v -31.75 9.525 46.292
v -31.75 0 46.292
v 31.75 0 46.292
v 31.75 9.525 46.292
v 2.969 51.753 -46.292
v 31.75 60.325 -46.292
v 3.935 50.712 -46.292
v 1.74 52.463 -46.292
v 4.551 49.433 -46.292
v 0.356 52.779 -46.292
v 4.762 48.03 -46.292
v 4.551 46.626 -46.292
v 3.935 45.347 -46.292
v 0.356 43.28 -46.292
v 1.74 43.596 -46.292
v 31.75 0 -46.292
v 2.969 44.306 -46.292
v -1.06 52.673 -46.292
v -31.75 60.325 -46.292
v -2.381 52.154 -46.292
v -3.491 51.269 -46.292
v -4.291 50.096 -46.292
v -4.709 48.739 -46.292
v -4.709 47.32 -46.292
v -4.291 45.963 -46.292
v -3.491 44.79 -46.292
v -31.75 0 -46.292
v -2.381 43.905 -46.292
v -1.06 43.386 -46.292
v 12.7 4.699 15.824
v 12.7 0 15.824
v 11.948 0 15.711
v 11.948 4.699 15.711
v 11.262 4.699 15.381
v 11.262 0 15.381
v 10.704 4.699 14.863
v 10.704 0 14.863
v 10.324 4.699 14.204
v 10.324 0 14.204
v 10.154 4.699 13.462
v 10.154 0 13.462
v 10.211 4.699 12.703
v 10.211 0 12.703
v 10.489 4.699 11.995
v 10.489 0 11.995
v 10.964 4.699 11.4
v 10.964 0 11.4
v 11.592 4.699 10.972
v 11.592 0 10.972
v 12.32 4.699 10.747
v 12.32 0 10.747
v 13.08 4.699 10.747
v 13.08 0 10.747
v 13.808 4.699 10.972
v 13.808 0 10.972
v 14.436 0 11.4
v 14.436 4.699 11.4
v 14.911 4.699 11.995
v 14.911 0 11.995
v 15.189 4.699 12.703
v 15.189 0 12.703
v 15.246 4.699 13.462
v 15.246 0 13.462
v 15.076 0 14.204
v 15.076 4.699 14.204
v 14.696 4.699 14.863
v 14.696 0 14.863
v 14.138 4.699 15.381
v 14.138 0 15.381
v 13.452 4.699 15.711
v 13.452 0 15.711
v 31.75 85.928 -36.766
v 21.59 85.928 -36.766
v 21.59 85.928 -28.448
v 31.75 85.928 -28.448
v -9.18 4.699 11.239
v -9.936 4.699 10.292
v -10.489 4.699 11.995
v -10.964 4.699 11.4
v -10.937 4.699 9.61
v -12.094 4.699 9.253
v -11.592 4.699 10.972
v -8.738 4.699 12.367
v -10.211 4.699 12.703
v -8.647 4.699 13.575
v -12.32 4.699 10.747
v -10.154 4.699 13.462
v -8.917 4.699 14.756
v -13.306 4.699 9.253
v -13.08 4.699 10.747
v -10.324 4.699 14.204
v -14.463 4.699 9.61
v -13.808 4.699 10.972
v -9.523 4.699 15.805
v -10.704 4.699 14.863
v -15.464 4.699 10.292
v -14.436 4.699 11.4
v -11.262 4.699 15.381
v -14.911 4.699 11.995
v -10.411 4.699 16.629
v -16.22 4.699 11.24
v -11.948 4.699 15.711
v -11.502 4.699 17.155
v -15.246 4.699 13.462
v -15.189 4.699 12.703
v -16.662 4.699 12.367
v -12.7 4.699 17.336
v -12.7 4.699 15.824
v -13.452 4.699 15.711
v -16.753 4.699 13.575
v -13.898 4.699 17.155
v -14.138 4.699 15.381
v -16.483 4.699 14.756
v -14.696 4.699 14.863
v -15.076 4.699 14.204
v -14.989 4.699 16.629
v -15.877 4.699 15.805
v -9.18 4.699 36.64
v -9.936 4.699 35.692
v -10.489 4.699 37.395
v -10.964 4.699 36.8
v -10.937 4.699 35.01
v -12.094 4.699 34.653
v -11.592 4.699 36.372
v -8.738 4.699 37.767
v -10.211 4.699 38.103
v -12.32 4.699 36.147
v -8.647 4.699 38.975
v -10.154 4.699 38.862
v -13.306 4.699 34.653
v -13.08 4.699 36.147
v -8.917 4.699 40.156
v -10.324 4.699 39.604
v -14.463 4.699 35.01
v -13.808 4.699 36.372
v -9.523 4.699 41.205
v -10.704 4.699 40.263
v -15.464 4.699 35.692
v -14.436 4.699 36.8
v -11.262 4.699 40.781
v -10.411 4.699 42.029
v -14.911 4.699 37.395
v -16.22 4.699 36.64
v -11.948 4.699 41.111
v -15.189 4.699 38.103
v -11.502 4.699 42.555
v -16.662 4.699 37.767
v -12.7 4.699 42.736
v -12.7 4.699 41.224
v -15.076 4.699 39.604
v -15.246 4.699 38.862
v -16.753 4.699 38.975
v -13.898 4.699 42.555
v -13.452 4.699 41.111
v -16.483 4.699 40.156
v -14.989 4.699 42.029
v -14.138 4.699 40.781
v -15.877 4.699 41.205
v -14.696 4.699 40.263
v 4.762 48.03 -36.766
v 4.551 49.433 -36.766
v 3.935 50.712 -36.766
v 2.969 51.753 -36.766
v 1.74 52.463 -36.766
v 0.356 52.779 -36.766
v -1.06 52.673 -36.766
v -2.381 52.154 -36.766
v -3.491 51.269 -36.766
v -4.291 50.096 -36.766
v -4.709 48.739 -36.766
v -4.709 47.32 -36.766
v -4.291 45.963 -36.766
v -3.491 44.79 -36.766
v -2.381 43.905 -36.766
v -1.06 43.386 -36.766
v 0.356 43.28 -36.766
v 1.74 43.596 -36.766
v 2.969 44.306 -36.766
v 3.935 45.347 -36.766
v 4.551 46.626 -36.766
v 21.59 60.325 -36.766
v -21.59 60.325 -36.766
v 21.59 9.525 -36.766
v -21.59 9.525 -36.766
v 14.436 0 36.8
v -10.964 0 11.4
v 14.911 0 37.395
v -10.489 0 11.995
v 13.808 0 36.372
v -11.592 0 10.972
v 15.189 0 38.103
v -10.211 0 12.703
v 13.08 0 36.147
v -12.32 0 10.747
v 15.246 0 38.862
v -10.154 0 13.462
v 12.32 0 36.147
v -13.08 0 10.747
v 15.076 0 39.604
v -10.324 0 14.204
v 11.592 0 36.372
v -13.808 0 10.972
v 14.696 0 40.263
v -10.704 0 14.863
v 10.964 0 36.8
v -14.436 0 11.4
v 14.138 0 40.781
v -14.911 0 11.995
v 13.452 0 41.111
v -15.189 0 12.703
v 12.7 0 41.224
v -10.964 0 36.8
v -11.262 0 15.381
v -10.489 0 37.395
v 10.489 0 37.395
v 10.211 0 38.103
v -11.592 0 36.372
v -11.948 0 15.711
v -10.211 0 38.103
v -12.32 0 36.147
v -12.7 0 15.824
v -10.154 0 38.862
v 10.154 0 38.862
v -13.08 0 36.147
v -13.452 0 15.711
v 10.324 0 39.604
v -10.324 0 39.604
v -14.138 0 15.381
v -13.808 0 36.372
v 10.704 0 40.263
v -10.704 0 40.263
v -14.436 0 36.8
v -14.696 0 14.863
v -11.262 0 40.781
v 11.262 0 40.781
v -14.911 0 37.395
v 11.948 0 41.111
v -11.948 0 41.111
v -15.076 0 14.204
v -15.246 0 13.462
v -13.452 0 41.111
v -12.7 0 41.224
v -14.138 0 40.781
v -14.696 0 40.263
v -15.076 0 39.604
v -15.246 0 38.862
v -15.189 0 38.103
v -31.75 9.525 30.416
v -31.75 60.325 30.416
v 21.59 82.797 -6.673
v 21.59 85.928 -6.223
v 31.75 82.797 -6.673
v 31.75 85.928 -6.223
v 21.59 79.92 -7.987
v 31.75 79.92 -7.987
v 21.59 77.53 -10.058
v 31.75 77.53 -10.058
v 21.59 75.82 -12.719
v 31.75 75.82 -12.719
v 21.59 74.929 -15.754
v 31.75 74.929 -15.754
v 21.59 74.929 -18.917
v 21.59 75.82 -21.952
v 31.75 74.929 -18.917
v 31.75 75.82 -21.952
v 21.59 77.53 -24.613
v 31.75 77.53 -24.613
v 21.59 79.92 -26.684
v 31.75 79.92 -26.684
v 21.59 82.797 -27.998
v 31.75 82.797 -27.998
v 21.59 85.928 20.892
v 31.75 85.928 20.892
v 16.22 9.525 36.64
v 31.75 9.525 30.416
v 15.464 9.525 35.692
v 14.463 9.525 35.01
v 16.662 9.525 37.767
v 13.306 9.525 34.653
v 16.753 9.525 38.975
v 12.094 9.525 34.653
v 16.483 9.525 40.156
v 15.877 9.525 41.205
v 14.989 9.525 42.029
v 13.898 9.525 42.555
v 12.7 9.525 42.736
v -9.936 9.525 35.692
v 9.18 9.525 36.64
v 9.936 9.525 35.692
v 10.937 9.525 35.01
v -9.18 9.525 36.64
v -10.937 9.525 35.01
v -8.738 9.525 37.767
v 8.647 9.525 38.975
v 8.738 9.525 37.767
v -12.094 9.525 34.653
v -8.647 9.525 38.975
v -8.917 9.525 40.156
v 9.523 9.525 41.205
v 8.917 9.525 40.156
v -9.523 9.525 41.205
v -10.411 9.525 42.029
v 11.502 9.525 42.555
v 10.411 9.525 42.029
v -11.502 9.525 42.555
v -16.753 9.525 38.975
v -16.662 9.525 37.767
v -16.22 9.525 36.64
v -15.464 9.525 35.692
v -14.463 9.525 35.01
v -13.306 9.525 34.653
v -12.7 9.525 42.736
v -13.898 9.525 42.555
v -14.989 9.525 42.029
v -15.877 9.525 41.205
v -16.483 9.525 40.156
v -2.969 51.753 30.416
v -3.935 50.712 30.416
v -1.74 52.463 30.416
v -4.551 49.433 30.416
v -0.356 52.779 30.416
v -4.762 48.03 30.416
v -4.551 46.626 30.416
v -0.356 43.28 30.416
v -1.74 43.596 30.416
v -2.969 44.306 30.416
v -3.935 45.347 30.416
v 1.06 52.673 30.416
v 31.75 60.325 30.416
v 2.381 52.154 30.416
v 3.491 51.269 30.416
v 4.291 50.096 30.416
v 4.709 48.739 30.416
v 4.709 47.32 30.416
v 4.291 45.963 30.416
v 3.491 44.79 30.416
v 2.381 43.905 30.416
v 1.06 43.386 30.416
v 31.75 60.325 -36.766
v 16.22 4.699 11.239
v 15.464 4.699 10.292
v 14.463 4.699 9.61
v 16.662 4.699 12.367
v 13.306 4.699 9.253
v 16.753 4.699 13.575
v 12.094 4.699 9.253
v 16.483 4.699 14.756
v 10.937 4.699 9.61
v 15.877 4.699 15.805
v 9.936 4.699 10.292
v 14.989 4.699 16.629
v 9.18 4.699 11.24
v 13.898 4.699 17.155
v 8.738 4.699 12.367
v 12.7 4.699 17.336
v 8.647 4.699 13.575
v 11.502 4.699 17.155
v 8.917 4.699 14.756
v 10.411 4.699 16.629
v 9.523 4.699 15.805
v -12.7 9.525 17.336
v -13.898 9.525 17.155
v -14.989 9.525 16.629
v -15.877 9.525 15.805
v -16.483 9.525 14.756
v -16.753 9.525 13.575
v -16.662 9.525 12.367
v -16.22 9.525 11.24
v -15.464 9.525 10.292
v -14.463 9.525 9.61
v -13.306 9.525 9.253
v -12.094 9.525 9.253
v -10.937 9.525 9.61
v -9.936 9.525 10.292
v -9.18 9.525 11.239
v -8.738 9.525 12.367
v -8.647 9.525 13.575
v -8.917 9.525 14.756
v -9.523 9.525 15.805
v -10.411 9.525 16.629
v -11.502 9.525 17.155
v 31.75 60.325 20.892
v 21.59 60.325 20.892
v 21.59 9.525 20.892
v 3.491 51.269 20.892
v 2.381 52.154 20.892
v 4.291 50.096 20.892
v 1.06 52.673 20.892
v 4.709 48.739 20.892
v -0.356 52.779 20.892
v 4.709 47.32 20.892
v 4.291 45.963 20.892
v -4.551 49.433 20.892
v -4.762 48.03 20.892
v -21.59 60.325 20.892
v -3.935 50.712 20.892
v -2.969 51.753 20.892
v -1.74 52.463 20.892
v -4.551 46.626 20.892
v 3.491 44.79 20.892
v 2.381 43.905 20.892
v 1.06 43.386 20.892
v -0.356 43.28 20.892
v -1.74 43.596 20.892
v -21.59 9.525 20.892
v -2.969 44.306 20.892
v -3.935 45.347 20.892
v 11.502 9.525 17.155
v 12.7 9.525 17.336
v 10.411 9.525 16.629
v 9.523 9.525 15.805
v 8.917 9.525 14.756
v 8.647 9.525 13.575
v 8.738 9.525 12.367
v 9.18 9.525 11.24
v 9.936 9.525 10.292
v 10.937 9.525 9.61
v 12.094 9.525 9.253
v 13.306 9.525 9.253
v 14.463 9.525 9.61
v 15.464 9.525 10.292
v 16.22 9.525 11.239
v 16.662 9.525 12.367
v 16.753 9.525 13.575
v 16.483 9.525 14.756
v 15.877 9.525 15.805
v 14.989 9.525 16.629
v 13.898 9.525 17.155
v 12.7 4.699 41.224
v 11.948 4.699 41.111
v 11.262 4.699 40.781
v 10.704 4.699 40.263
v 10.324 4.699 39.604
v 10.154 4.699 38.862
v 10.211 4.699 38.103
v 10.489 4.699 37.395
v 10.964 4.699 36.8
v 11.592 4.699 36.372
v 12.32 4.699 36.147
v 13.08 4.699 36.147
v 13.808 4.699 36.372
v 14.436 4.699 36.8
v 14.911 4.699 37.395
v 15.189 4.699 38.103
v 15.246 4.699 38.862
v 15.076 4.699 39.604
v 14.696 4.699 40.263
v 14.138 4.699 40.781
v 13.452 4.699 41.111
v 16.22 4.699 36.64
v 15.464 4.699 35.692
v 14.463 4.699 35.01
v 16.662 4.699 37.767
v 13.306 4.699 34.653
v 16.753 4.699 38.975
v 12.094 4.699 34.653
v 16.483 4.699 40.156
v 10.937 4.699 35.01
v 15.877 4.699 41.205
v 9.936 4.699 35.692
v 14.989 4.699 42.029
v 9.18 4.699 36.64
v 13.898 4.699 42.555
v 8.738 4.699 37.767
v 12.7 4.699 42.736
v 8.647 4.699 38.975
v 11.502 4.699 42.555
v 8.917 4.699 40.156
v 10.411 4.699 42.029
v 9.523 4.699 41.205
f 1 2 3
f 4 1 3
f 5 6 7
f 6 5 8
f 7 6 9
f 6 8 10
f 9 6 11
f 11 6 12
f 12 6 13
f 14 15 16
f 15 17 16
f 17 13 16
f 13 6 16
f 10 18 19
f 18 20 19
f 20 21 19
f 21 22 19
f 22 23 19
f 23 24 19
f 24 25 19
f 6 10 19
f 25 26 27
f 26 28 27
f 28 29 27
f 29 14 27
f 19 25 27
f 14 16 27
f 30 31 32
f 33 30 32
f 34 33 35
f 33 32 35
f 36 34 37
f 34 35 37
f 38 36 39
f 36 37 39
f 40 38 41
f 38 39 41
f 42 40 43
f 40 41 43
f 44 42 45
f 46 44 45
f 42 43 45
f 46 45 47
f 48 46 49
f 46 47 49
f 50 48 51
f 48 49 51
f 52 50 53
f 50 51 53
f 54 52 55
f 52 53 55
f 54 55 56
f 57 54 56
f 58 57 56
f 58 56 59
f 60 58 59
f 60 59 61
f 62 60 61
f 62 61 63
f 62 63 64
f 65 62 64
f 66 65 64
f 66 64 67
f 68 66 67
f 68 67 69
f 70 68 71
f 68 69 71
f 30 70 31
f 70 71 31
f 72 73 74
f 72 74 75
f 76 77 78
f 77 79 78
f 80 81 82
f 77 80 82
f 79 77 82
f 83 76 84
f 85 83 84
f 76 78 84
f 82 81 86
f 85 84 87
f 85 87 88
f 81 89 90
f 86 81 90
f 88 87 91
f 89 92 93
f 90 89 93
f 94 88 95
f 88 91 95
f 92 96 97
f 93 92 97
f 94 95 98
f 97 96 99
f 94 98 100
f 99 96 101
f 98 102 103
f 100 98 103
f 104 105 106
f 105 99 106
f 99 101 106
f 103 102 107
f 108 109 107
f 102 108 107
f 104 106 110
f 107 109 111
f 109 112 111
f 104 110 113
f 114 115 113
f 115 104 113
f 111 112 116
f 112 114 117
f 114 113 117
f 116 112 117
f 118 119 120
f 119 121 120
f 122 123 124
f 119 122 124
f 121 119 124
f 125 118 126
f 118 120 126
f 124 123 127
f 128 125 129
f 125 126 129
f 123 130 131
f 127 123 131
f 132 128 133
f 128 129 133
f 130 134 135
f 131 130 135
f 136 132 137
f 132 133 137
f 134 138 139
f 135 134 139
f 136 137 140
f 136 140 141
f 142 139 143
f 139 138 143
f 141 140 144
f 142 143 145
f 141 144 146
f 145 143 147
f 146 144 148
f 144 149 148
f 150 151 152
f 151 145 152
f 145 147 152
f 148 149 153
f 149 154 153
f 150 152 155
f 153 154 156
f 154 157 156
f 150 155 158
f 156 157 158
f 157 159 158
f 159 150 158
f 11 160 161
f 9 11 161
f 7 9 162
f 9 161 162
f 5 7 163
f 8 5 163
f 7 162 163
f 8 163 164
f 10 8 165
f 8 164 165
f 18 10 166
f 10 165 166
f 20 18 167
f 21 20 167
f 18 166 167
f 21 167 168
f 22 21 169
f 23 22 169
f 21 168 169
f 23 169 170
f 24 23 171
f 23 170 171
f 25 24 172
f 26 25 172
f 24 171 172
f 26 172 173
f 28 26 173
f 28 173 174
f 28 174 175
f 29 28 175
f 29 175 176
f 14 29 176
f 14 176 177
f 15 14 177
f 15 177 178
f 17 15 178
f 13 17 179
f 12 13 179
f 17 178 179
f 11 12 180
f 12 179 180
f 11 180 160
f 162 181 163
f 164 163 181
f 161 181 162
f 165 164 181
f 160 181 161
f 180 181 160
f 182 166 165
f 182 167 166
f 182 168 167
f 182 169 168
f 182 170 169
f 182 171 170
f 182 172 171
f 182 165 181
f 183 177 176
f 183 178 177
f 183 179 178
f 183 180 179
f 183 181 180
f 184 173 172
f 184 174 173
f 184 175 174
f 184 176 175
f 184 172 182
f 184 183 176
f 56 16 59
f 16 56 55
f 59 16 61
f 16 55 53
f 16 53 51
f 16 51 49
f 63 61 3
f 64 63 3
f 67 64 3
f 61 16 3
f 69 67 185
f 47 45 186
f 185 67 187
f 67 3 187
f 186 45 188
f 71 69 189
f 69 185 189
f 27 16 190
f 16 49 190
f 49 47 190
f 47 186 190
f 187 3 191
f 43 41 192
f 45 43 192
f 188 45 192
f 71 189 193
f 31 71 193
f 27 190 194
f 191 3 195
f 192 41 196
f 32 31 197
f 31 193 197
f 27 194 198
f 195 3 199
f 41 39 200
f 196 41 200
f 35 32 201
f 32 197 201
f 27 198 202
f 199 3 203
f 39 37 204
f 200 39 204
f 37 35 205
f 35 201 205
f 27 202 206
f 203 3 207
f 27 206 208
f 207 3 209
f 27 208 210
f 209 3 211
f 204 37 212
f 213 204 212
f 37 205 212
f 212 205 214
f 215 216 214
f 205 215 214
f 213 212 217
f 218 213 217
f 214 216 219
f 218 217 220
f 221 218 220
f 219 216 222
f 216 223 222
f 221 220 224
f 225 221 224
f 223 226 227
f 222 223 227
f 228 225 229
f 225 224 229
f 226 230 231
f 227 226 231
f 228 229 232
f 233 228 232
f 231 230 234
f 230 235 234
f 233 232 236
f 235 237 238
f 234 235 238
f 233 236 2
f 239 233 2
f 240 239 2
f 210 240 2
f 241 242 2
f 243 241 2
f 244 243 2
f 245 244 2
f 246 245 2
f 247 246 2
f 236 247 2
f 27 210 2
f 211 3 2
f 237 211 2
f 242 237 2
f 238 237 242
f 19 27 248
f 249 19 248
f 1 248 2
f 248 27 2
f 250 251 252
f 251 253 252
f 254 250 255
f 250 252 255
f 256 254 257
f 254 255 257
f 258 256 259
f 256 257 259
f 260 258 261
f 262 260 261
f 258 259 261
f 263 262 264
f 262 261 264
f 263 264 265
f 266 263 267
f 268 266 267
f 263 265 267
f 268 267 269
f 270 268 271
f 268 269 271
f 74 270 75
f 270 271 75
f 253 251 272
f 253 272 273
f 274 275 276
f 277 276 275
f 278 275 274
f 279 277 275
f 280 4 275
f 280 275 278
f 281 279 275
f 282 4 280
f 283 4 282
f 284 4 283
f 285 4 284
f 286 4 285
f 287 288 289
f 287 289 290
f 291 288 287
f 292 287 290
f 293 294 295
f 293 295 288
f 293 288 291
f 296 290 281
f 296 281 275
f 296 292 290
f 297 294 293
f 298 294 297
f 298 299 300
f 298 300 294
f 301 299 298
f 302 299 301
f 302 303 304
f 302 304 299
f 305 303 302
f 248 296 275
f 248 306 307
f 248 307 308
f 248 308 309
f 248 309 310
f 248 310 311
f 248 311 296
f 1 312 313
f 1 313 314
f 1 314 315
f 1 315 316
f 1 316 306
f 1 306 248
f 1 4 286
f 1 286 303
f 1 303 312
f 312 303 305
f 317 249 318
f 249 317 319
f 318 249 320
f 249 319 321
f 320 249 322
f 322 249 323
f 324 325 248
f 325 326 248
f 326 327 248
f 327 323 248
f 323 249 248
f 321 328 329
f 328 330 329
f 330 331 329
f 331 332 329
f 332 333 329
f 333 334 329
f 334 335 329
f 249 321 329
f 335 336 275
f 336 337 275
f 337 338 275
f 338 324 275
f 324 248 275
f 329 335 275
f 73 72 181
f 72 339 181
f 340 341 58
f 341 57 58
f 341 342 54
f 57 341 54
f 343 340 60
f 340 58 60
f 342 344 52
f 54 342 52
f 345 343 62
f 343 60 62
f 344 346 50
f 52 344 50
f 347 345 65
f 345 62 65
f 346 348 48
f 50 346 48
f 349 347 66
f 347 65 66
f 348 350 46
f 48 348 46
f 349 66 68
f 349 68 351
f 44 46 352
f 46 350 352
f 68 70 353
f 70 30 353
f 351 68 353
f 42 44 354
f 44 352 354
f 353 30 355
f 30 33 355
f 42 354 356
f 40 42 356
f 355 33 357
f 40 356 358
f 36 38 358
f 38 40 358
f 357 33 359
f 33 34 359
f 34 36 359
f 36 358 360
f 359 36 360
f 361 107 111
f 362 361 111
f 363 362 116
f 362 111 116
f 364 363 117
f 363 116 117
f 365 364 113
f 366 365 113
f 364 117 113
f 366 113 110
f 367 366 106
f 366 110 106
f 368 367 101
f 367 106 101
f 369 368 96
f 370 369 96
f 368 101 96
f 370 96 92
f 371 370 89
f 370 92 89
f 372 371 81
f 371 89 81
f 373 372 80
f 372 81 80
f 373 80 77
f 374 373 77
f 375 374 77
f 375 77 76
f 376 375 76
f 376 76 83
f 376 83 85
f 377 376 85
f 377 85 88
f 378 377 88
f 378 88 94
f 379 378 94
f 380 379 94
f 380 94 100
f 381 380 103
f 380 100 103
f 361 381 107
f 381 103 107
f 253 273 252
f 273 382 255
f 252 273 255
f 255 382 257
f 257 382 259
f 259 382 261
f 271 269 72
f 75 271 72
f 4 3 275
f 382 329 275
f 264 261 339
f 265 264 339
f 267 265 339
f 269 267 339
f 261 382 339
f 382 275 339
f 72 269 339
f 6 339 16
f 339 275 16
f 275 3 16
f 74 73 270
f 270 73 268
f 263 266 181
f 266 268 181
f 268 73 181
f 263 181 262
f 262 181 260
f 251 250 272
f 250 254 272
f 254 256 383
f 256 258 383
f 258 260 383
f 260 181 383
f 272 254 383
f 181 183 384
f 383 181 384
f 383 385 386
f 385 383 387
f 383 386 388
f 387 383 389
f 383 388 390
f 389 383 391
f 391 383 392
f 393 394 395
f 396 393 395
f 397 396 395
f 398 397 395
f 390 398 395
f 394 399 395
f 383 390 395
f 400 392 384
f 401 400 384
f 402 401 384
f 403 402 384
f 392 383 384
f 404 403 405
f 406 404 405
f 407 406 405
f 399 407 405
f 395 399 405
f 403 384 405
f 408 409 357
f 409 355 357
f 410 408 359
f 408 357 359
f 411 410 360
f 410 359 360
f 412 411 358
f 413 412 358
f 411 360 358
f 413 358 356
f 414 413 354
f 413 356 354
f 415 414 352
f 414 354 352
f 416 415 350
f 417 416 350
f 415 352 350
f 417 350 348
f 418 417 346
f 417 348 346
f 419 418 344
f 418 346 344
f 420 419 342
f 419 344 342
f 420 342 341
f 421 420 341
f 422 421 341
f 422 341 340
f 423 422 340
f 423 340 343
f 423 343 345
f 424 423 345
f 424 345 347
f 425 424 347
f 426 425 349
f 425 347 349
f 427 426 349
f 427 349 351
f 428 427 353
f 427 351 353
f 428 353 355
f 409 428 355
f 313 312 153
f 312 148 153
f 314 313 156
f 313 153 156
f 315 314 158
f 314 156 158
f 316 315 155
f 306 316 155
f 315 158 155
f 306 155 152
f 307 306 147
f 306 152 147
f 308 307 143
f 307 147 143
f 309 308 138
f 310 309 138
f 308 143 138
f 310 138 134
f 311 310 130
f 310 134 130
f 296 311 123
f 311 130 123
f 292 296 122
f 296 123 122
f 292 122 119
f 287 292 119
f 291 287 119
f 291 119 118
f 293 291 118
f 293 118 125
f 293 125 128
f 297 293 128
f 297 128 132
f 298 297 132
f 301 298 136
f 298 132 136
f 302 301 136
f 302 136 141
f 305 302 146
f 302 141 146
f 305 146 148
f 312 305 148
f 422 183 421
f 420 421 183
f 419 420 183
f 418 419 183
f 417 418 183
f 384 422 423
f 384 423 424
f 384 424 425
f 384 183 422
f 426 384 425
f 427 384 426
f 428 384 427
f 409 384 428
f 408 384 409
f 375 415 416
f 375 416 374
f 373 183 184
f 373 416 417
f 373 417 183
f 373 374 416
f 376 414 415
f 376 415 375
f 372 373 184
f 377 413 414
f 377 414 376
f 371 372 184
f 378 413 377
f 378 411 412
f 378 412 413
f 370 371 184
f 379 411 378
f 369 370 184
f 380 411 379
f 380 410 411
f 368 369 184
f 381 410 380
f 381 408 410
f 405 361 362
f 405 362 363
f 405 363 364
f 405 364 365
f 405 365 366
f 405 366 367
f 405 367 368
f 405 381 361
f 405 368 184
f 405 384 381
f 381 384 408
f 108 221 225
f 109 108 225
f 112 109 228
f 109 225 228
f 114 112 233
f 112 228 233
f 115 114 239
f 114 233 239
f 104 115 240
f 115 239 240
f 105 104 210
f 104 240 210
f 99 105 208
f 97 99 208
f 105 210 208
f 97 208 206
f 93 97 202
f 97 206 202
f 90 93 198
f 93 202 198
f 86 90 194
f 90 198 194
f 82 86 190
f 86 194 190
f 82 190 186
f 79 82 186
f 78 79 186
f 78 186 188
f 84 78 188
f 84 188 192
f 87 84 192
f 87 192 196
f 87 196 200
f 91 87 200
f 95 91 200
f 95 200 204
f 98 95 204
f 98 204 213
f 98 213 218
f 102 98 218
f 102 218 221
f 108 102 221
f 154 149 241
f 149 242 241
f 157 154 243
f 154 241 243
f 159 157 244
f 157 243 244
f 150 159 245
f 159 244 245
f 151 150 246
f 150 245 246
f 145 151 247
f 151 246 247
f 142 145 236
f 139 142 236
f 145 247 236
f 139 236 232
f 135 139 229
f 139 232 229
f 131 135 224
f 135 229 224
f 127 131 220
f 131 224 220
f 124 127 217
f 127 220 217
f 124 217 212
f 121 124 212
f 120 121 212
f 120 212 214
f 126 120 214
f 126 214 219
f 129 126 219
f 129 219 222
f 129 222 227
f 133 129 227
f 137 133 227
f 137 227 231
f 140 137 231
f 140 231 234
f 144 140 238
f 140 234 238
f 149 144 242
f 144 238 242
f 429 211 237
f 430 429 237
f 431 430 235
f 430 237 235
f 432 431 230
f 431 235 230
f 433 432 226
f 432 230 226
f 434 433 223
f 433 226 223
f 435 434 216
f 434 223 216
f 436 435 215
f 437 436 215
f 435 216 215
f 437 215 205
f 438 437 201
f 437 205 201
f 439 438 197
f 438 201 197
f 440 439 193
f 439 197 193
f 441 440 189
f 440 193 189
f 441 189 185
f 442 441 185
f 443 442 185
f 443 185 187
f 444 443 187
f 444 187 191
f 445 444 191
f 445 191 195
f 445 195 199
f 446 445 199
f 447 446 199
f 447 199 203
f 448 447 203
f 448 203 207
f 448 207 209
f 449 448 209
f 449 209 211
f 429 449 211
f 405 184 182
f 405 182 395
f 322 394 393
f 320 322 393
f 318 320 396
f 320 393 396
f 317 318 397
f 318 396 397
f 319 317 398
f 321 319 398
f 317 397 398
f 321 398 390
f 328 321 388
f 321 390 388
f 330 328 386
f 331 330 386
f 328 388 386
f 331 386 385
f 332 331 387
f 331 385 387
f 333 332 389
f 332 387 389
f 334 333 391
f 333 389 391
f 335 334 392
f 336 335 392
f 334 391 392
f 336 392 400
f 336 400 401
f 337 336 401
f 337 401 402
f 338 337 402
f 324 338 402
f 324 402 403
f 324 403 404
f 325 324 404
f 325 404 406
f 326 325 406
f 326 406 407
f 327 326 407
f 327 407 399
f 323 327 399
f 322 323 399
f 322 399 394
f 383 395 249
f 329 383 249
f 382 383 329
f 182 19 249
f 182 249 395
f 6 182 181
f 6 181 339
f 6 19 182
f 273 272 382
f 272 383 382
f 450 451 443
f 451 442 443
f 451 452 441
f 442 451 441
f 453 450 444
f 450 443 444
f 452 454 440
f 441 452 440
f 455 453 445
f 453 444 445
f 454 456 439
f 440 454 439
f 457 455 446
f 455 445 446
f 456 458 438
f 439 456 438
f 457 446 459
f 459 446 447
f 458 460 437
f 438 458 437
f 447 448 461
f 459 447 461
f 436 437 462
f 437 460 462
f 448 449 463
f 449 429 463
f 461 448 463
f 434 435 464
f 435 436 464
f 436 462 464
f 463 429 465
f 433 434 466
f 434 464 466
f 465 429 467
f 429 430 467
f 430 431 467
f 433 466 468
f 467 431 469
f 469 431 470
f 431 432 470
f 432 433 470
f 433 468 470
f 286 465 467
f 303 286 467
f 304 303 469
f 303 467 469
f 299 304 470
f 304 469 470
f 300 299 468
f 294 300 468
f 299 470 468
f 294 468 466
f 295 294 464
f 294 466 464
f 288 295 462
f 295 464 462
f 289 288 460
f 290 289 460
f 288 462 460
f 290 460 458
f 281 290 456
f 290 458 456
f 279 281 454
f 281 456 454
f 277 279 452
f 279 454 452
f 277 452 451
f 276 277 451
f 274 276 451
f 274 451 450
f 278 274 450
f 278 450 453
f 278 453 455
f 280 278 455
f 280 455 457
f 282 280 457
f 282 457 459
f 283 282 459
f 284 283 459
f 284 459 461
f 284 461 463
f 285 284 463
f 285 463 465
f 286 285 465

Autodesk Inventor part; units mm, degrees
ref_plane "YZ Plane" through (0, 0, 0) normal (1, 0, 0) x (0, 1, 0)
ref_plane "XZ Plane" through (0, 0, 0) normal (0, 1, 0) x (-1, 0, 0)
ref_plane "XY Plane" through (0, 0, 0) normal (0, 0, 1) x (1, 0, 0)
sketch "Sketch1" plane through (0, 0, 0) normal (0, 1, 0) x (-1, 0, 0)
  line L0 (50.8, 46.2915) -> (-50.8, 46.2915)
  line L1 (-50.8, 46.2915) -> (-50.8, -46.2915)
  line L2 (-50.8, -46.2915) -> (50.8, -46.2915)
  line L3 (50.8, -46.2915) -> (50.8, 46.2915)
  line L4 (50.8, 46.2915) -> (-50.8, -46.2915) construction
  line L5 (-50.8, 46.2915) -> (50.8, -46.2915) construction
  point P0 (0, 0)
  dimension "width" = 101.6
  dimension "depth" = 92.583
extrude "Extrusion1" add sketch "Sketch1" along normal blind 9.525
sketch "Sketch2" plane through (0, 9.525, 0) normal (0, 1, 0) x (1, 0, 0)
  line L0 (-12.7, -38.6715) -> (12.7, -38.6715) construction
  line L1 (12.7, -38.6715) -> (12.7, -13.2715) construction
  line L2 (12.7, -13.2715) -> (-12.7, -13.2715) construction
  line L3 (-12.7, -13.2715) -> (-12.7, -38.6715) construction
  line L4 (-12.7, -38.6715) -> (12.7, -13.2715) construction
  line L5 (12.7, -38.6715) -> (-12.7, -13.2715) construction
  line L6 (-50.8, -46.2915) -> (50.8, -46.2915) projected
  point P0 (0, 0)
  point P1 (0, -25.9715)
  dimension "d4" = 25.4
  dimension "d5" = 25.4
  dimension "d6" = 7.62
hole "Hole1" at (-12.7, 9.525, 38.6715) at (12.7, 9.525, 38.6715) at (12.7, 9.525, 13.2715) at (-12.7, 9.525, 13.2715) direction (0, -1, 0) diameter 5.1054 end through all counterbore diameter 8.128 counterbore depth 4.826 clearance for "Socket Head Cap Screw" size "#10" standard "Ansi Unified Screw Threads"
sketch "Sketch3" plane through (0, 9.525, 0) normal (0, 1, 0) x (1, 0, 0)
  line L0 (-50.8, 46.2915) -> (-50.8, -46.2915) projected
  line L1 (50.8, -46.2915) -> (50.8, 46.2915) projected
  line L2 (-50.8, -30.4165) -> (50.8, -30.4165)
  line L3 (50.8, -30.4165) -> (50.8, -20.8915)
  line L4 (50.8, -20.8915) -> (-50.8, -20.8915)
  line L5 (-50.8, -20.8915) -> (-50.8, -30.4165)
  line L6 (-50.8, -46.2915) -> (50.8, -46.2915) projected
  point P0 (0, 0)
  point P1 (-50.8, -20.8915)
  point P2 (50.8, -30.4165)
  dimension "d14" = 9.525
  dimension "d16" = 25.4
extrude "Extrusion2" add sketch "Sketch3" along normal blind 50.8 contours L4 L1 L2 L0
sketch "Sketch5" plane through (50.8, 9.525, 20.8915) normal (0, 0, -1) x (-1, 0, 0)
  circle A0 centre (50.8, 38.5045) radius 4.7625 projected
  circle A1 centre (50.8, 38.5045) radius 4.7625
  point P0 (50.8, -9.525)
extrude "Extrusion4" cut sketch "Sketch5" against normal through all
sketch "Sketch6" plane through (0, 9.525, 0) normal (0, 1, 0) x (1, 0, 0)
  line L0 (50.8, 46.2915) -> (-50.8, 46.2915) projected
  line L1 (50.8, -20.8915) -> (50.8, 46.2915) projected
  line L2 (-50.8, 46.2915) -> (50.8, 46.2915)
  line L3 (50.8, 46.2915) -> (50.8, 36.7665)
  line L4 (50.8, 36.7665) -> (-50.8, 36.7665)
  line L5 (-50.8, 36.7665) -> (-50.8, 46.2915)
  point P0 (0, 0)
  dimension "d24" = 9.525
extrude "Extrusion5" add sketch "Sketch6" along normal blind 50.8
sketch "Sketch7" plane through (-50.8, 9.525, -36.7665) normal (0, 0, 1) x (1, 0, 0)
  circle A0 centre (50.8, 38.5045) radius 4.7625 projected
  circle A1 centre (50.8, 38.5045) radius 4.7625
  point P0 (50.8, -9.525)
extrude "Extrusion6" cut sketch "Sketch7" against normal through all
sketch "Sketch8" plane through (0, 0, 0) normal (0, -1, 0) x (1, 0, 0)
  line L0 (-50.8, -46.2915) -> (-50.8, 46.2915) projected
  line L1 (50.8, -46.2915) -> (-50.8, -46.2915) projected
  line L2 (-50.8, 46.2915) -> (-31.75, 46.2915)
  line L3 (-31.75, 46.2915) -> (-31.75, -46.2915)
  line L4 (-31.75, -46.2915) -> (-50.8, -46.2915)
  line L5 (-50.8, -46.2915) -> (-50.8, 46.2915)
  line L6 (50.8, 46.2915) -> (31.75, 46.2915)
  line L7 (31.75, 46.2915) -> (31.75, -46.2915)
  line L8 (31.75, -46.2915) -> (50.8, -46.2915)
  line L9 (50.8, -46.2915) -> (50.8, 46.2915)
  point P0 (0, 0)
  dimension "d29" = 19.05
  dimension "d30" = 19.05
extrude "Extrusion7" cut sketch "Sketch8" against normal through all
sketch "Sketch9" plane through (0, 9.525, 0) normal (0, 1, 0) x (1, 0, 0)
  line L0 (31.75, 36.7665) -> (31.75, 46.2915) projected
  line L1 (-31.75, -20.8915) -> (31.75, -20.8915) projected
  line L2 (31.75, 36.7665) -> (21.59, 36.7665)
  line L3 (21.59, 36.7665) -> (21.59, -20.8915)
  line L4 (21.59, -20.8915) -> (31.75, -20.8915)
  line L5 (31.75, -20.8915) -> (31.75, 36.7665)
  point P0 (0, 0)
  point P1 (31.75, -20.8915)
  dimension "d33" = 10.16
extrude "Extrusion8" add sketch "Sketch9" along normal blind 76.4032
sketch "Sketch10" plane through (31.75, 0, 46.2915) normal (1, 0, 0) x (0, 0, -1)
  line L0 (25.4, 85.9282) -> (83.058, 85.9282) projected
  circle A0 centre (63.627, 85.9282) radius 11.1125
  line L1 (25.4, 60.325) -> (25.4, 85.9282) projected
  point P0 (46.2915, 0)
  point P1 (74.7395, 85.9282)
  point P2 (52.5145, 85.9282)
  dimension "d36" = 38.227
  dimension "d39" = 22.225
extrude "Extrusion9" cut sketch "Sketch10" against normal through all contours L0 A0 picked at (65.7312, 79.4369)
sketch "Sketch11" plane through (0, 9.525, 0) normal (0, 1, 0) x (1, 0, 0)
  line L0 (-31.75, 36.7665) -> (-31.75, -20.8915) projected
  line L1 (-31.75, -20.8915) -> (21.59, -20.8915) projected
  line L2 (-31.75, 36.7665) -> (-21.59, 36.7665)
  line L3 (-21.59, 36.7665) -> (-21.59, -20.8915)
  line L4 (-21.59, -20.8915) -> (-31.75, -20.8915)
  line L5 (-31.75, -20.8915) -> (-31.75, 36.7665)
  point P0 (0, 0)
  dimension "d40" = 10.16
extrude "Extrusion10" add sketch "Sketch11" along normal blind 50.8
equation "\"width\" = overallWidth"
equation "\"depth\" = overallDepth"
equation "\"overallWidth\" = 101.6"
equation "\"gapBetweeenMotorAndBasePlate\" = 0.635"
equation "\"overallDepth\" = 92.583"
properties part number "plateForPot" material "ABS Plastic"
